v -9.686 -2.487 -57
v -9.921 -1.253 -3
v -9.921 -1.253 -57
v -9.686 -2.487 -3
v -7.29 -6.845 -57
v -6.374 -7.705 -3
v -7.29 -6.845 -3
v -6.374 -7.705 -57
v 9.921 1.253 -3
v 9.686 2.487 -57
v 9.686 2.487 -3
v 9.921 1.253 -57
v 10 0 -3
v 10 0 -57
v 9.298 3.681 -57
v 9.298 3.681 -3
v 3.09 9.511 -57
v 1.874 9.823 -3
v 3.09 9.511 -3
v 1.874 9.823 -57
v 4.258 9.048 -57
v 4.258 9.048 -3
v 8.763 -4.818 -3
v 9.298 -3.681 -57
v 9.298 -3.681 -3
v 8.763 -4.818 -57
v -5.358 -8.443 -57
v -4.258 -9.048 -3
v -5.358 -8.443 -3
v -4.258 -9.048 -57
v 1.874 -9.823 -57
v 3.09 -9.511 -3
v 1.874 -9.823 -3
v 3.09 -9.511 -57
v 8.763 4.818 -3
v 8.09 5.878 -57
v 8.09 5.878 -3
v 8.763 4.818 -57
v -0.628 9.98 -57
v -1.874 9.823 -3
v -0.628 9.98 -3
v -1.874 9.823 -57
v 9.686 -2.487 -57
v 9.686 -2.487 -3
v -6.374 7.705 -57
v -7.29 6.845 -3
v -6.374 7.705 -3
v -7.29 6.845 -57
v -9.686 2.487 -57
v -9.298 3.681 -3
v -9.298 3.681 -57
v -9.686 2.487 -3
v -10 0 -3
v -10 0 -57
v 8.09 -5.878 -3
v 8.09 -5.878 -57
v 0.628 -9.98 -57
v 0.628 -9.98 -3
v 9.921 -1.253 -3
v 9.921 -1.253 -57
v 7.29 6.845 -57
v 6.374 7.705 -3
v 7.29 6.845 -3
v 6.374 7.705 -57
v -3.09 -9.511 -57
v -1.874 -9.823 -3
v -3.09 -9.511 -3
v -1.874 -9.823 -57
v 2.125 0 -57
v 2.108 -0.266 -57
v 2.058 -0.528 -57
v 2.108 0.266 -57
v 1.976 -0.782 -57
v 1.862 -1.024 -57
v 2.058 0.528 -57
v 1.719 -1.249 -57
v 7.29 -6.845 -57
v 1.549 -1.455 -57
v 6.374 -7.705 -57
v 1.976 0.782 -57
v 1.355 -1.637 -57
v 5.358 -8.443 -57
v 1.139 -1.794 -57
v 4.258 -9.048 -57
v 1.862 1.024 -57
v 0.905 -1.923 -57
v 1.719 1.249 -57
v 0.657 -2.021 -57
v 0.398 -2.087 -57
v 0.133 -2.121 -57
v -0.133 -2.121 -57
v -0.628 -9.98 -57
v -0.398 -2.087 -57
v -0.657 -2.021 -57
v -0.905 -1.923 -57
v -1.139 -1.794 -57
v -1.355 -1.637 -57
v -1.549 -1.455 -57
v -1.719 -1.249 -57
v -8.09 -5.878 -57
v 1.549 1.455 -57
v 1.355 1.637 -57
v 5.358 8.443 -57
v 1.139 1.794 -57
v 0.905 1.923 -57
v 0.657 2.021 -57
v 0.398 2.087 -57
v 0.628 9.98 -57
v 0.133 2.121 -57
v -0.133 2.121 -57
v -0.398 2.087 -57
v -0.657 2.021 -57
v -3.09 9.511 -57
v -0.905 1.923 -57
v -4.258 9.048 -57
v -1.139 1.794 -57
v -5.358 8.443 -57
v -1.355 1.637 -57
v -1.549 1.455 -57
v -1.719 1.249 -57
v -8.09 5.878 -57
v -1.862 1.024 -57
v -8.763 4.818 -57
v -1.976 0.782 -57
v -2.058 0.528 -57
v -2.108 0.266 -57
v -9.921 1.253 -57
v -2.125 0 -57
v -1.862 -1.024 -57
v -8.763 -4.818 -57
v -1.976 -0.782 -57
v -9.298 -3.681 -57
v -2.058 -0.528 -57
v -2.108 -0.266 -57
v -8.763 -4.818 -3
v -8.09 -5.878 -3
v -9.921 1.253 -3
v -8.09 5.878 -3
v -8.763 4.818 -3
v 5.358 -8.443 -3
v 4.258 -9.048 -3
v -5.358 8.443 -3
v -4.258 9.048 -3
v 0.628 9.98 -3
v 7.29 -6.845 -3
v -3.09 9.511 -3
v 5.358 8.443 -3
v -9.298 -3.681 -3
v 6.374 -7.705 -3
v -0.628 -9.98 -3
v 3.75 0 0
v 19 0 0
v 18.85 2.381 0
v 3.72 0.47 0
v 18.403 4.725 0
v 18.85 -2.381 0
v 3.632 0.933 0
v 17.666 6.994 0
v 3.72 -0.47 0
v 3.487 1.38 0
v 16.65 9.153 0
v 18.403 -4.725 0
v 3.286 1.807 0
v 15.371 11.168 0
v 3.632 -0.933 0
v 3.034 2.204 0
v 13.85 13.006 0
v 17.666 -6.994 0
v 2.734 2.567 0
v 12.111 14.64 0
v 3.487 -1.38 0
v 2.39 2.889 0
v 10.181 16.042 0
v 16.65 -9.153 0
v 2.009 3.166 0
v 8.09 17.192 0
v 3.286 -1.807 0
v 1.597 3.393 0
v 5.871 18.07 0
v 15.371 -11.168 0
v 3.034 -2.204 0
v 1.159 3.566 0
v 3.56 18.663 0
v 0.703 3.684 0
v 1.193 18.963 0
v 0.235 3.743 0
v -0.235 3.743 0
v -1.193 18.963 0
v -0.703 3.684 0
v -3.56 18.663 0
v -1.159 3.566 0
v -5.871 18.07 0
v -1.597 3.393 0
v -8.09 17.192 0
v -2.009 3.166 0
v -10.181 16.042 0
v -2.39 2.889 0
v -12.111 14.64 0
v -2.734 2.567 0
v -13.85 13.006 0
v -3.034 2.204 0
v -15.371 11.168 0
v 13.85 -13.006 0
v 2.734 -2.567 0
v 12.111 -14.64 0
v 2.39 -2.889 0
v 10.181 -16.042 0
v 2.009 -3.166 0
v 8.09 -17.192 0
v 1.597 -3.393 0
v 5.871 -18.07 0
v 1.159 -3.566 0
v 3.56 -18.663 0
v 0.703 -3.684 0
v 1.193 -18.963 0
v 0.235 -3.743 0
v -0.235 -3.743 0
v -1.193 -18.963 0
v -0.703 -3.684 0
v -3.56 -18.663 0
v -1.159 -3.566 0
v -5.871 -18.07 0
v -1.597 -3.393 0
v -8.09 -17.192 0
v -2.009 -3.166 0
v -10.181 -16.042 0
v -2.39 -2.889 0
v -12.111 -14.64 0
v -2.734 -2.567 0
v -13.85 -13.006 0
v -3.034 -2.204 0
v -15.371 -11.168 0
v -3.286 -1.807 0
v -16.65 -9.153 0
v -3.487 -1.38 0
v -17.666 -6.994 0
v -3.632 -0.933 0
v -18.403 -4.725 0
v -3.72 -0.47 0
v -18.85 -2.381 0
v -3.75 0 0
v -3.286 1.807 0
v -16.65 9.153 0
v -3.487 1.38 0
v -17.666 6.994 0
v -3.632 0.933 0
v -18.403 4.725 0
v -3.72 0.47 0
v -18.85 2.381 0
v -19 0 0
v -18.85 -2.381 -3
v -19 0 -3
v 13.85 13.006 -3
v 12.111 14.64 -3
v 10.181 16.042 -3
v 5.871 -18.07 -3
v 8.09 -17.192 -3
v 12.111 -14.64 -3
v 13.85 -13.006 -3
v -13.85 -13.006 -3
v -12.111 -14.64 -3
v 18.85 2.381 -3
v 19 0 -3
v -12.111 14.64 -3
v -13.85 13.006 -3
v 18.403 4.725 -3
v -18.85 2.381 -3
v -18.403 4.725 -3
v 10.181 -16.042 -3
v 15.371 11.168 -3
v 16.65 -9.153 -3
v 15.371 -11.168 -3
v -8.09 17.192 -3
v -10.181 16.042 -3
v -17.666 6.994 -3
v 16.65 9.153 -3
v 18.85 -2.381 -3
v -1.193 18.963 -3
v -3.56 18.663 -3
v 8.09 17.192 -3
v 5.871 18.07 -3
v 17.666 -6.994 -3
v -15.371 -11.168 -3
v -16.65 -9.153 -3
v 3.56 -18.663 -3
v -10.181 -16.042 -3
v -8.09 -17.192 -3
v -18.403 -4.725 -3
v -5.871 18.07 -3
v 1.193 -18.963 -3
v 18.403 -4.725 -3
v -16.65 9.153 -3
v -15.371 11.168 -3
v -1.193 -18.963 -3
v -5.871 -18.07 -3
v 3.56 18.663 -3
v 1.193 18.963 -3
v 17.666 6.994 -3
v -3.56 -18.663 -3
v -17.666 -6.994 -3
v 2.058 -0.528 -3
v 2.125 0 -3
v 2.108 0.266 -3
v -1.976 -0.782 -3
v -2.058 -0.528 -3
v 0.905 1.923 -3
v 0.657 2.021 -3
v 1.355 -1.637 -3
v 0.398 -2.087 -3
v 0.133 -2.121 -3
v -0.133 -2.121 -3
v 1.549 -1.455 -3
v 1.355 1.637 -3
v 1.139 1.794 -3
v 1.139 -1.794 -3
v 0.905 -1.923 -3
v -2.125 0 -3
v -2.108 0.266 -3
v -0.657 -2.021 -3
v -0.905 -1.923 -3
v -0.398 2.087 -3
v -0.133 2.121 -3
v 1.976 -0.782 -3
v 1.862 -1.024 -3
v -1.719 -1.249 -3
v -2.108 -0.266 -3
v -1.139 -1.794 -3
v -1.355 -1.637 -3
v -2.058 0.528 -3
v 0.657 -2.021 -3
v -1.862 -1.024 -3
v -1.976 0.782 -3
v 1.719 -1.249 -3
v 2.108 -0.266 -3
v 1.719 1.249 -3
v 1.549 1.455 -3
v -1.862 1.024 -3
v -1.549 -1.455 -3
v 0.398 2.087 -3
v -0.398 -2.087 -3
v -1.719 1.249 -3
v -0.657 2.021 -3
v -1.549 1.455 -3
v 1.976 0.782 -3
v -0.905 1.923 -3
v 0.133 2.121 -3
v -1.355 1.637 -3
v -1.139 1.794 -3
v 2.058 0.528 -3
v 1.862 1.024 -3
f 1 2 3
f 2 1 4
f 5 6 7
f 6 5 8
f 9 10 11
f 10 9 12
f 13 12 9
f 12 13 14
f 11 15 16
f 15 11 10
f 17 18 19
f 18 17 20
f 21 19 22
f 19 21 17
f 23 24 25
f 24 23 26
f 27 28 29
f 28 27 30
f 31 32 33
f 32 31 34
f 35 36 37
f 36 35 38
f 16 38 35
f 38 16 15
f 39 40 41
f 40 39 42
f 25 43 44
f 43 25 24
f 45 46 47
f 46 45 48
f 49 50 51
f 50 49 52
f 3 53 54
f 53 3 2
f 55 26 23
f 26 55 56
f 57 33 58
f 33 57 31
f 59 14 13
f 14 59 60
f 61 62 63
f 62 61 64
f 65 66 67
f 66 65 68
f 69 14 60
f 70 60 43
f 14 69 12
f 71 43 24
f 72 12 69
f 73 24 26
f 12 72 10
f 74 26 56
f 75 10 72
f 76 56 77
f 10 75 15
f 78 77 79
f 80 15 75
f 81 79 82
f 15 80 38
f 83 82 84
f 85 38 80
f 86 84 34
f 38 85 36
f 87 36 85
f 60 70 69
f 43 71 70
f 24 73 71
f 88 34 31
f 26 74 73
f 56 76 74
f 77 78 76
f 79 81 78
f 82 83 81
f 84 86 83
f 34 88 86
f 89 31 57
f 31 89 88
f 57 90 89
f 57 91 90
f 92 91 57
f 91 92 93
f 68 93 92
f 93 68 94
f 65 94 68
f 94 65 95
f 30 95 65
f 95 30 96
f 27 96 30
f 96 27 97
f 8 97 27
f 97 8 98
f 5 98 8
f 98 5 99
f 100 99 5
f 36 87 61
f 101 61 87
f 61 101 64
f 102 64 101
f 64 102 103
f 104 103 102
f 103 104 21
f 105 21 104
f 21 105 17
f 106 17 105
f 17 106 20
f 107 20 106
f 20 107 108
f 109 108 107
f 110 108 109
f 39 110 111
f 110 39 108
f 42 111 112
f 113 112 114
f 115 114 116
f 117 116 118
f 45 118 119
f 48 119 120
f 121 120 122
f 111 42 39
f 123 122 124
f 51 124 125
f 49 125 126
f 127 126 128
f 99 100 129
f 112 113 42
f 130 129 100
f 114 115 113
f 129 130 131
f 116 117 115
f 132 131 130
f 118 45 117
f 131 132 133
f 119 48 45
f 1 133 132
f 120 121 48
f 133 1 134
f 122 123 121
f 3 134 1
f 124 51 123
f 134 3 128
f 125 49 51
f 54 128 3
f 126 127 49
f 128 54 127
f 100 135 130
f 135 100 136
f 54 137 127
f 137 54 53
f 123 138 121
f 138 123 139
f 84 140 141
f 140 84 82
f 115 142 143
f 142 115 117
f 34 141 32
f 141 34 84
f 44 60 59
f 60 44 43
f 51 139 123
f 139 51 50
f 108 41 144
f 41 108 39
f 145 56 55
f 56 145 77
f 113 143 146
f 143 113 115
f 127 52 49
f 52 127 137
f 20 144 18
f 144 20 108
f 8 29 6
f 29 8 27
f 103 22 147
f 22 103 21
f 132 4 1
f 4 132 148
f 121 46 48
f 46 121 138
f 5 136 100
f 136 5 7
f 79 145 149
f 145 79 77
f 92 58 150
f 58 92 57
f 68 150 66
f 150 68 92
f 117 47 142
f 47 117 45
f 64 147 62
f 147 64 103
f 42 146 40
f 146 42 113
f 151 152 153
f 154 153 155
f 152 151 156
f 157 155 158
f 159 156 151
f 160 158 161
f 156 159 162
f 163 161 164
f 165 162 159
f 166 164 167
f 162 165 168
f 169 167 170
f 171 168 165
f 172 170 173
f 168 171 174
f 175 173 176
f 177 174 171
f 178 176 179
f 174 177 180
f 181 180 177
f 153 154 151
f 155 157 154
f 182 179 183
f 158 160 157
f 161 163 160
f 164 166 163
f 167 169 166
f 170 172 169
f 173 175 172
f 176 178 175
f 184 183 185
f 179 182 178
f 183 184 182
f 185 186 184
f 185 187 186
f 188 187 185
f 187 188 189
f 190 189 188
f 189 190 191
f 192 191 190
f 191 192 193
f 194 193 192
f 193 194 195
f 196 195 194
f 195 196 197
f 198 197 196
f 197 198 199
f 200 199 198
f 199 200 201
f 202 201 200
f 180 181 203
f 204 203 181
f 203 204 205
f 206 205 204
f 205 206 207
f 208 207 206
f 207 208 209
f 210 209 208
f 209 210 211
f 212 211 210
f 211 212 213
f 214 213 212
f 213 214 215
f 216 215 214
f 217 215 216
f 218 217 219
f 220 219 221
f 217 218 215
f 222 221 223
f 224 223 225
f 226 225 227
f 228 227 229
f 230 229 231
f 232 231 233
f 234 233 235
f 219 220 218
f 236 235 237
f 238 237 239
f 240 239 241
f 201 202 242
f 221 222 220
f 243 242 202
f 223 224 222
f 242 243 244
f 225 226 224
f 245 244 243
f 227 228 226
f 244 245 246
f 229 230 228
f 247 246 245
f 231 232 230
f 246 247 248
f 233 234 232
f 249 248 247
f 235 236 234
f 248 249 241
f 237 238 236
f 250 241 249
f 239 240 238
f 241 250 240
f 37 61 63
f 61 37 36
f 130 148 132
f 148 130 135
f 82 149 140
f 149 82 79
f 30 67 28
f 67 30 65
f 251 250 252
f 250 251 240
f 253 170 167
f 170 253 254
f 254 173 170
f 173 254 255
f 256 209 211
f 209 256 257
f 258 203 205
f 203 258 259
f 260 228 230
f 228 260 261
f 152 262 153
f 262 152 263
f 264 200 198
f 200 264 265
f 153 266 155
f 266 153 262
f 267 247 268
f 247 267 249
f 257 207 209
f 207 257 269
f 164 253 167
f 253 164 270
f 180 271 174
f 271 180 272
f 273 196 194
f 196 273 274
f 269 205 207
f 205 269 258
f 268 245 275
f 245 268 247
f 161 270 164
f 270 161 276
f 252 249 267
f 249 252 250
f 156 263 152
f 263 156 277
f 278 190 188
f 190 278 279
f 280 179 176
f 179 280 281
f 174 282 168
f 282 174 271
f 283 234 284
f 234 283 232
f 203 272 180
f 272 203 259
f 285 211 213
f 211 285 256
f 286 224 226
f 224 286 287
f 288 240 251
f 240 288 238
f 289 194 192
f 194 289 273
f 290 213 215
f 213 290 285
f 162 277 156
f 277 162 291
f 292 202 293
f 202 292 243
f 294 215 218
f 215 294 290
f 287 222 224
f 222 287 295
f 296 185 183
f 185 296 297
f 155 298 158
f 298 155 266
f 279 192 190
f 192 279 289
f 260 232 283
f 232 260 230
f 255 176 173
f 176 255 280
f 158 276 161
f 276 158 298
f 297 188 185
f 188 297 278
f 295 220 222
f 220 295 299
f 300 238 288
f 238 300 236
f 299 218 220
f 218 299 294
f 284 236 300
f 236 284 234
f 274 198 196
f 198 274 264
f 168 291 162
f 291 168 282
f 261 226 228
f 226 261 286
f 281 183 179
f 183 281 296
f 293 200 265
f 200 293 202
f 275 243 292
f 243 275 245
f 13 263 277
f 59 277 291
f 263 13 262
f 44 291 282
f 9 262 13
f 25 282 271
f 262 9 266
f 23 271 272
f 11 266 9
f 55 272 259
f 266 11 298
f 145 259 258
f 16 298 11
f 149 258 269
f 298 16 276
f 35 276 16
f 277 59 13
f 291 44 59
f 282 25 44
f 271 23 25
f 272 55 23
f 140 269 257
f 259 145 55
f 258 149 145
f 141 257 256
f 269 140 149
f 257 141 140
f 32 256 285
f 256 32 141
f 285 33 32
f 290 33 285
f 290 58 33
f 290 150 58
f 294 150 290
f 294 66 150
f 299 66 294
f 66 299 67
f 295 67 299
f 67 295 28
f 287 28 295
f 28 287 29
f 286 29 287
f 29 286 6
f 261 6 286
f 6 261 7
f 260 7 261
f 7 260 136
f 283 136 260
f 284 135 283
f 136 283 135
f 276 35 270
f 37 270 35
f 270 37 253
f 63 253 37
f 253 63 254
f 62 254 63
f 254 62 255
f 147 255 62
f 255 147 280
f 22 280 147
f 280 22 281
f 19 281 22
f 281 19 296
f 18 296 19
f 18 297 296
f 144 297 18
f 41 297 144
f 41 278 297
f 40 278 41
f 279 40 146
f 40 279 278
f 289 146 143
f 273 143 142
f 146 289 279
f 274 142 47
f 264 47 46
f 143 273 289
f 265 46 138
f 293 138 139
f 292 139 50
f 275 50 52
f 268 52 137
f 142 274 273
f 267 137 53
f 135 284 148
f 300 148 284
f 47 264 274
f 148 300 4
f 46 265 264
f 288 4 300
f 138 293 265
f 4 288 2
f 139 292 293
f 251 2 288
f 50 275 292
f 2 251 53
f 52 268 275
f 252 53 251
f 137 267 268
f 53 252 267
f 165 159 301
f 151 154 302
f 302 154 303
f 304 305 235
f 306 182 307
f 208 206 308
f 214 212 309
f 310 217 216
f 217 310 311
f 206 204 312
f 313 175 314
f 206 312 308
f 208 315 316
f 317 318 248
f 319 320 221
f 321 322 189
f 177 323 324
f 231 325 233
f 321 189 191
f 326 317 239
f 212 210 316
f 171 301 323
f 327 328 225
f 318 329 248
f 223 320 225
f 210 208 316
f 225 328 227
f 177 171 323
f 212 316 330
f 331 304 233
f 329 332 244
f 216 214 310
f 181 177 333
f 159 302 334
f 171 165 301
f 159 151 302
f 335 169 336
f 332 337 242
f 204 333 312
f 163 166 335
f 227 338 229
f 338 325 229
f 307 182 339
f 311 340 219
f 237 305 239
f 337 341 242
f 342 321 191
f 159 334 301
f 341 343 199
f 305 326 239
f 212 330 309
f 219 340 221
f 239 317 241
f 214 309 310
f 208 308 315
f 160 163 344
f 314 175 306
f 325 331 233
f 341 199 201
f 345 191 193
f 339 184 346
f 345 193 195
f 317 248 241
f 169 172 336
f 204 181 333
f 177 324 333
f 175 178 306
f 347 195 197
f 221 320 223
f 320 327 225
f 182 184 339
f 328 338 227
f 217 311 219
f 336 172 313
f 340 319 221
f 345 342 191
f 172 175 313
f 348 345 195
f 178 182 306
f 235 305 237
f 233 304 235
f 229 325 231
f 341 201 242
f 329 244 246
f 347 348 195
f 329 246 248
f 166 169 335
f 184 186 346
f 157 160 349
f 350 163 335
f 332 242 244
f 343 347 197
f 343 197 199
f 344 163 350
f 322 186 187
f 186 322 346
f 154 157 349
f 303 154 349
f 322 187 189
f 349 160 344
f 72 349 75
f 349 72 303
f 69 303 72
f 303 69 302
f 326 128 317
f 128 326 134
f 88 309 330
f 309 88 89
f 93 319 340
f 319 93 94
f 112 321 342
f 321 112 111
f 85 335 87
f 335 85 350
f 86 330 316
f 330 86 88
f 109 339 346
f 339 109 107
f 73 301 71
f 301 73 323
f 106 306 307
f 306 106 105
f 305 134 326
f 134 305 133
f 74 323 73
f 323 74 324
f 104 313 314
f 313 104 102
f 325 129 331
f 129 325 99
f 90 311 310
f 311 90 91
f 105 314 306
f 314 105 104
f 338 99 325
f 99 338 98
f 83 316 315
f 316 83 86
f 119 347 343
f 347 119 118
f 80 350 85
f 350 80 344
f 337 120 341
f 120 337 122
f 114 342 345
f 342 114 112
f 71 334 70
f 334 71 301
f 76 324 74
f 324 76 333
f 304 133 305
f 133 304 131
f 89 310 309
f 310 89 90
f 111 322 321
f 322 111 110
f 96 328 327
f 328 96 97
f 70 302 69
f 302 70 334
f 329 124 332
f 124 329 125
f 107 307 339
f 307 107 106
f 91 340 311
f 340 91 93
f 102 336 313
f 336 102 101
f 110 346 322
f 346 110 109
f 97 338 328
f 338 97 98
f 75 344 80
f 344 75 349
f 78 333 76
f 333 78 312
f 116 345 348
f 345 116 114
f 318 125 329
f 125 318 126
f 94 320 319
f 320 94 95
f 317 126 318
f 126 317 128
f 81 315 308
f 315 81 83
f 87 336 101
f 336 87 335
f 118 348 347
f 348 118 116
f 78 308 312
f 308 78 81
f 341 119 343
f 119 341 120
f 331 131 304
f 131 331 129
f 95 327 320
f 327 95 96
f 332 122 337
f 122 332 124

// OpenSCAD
$fn = 50;


difference() {
	union() {
		translate(v = [0, 0, -57.0000000000]) {
			cylinder(h = 57, r = 10.0000000000);
		}
		translate(v = [0, 0, -3.0000000000]) {
			cylinder(h = 3, r = 19.0000000000);
		}
	}
	union() {
		translate(v = [0, 0, 0]) {
			rotate(a = [0, 0, 0]) {
				difference() {
					union() {
						#translate(v = [0, 0, -57.0000000000]) {
							cylinder(h = 57, r = 2.0000000000);
						}
						#translate(v = [0, 0, -3]) {
							cylinder(h = 3, r1 = 2.1250000000, r2 = 3.7500000000);
						}
						#translate(v = [0, 0, -57.0000000000]) {
							cylinder(h = 57, r = 2.1250000000);
						}
						#translate(v = [0, 0, -57.0000000000]) {
							cylinder(h = 57, r = 2.0000000000);
						}
					}
					union();
				}
			}
		}
	}
}
